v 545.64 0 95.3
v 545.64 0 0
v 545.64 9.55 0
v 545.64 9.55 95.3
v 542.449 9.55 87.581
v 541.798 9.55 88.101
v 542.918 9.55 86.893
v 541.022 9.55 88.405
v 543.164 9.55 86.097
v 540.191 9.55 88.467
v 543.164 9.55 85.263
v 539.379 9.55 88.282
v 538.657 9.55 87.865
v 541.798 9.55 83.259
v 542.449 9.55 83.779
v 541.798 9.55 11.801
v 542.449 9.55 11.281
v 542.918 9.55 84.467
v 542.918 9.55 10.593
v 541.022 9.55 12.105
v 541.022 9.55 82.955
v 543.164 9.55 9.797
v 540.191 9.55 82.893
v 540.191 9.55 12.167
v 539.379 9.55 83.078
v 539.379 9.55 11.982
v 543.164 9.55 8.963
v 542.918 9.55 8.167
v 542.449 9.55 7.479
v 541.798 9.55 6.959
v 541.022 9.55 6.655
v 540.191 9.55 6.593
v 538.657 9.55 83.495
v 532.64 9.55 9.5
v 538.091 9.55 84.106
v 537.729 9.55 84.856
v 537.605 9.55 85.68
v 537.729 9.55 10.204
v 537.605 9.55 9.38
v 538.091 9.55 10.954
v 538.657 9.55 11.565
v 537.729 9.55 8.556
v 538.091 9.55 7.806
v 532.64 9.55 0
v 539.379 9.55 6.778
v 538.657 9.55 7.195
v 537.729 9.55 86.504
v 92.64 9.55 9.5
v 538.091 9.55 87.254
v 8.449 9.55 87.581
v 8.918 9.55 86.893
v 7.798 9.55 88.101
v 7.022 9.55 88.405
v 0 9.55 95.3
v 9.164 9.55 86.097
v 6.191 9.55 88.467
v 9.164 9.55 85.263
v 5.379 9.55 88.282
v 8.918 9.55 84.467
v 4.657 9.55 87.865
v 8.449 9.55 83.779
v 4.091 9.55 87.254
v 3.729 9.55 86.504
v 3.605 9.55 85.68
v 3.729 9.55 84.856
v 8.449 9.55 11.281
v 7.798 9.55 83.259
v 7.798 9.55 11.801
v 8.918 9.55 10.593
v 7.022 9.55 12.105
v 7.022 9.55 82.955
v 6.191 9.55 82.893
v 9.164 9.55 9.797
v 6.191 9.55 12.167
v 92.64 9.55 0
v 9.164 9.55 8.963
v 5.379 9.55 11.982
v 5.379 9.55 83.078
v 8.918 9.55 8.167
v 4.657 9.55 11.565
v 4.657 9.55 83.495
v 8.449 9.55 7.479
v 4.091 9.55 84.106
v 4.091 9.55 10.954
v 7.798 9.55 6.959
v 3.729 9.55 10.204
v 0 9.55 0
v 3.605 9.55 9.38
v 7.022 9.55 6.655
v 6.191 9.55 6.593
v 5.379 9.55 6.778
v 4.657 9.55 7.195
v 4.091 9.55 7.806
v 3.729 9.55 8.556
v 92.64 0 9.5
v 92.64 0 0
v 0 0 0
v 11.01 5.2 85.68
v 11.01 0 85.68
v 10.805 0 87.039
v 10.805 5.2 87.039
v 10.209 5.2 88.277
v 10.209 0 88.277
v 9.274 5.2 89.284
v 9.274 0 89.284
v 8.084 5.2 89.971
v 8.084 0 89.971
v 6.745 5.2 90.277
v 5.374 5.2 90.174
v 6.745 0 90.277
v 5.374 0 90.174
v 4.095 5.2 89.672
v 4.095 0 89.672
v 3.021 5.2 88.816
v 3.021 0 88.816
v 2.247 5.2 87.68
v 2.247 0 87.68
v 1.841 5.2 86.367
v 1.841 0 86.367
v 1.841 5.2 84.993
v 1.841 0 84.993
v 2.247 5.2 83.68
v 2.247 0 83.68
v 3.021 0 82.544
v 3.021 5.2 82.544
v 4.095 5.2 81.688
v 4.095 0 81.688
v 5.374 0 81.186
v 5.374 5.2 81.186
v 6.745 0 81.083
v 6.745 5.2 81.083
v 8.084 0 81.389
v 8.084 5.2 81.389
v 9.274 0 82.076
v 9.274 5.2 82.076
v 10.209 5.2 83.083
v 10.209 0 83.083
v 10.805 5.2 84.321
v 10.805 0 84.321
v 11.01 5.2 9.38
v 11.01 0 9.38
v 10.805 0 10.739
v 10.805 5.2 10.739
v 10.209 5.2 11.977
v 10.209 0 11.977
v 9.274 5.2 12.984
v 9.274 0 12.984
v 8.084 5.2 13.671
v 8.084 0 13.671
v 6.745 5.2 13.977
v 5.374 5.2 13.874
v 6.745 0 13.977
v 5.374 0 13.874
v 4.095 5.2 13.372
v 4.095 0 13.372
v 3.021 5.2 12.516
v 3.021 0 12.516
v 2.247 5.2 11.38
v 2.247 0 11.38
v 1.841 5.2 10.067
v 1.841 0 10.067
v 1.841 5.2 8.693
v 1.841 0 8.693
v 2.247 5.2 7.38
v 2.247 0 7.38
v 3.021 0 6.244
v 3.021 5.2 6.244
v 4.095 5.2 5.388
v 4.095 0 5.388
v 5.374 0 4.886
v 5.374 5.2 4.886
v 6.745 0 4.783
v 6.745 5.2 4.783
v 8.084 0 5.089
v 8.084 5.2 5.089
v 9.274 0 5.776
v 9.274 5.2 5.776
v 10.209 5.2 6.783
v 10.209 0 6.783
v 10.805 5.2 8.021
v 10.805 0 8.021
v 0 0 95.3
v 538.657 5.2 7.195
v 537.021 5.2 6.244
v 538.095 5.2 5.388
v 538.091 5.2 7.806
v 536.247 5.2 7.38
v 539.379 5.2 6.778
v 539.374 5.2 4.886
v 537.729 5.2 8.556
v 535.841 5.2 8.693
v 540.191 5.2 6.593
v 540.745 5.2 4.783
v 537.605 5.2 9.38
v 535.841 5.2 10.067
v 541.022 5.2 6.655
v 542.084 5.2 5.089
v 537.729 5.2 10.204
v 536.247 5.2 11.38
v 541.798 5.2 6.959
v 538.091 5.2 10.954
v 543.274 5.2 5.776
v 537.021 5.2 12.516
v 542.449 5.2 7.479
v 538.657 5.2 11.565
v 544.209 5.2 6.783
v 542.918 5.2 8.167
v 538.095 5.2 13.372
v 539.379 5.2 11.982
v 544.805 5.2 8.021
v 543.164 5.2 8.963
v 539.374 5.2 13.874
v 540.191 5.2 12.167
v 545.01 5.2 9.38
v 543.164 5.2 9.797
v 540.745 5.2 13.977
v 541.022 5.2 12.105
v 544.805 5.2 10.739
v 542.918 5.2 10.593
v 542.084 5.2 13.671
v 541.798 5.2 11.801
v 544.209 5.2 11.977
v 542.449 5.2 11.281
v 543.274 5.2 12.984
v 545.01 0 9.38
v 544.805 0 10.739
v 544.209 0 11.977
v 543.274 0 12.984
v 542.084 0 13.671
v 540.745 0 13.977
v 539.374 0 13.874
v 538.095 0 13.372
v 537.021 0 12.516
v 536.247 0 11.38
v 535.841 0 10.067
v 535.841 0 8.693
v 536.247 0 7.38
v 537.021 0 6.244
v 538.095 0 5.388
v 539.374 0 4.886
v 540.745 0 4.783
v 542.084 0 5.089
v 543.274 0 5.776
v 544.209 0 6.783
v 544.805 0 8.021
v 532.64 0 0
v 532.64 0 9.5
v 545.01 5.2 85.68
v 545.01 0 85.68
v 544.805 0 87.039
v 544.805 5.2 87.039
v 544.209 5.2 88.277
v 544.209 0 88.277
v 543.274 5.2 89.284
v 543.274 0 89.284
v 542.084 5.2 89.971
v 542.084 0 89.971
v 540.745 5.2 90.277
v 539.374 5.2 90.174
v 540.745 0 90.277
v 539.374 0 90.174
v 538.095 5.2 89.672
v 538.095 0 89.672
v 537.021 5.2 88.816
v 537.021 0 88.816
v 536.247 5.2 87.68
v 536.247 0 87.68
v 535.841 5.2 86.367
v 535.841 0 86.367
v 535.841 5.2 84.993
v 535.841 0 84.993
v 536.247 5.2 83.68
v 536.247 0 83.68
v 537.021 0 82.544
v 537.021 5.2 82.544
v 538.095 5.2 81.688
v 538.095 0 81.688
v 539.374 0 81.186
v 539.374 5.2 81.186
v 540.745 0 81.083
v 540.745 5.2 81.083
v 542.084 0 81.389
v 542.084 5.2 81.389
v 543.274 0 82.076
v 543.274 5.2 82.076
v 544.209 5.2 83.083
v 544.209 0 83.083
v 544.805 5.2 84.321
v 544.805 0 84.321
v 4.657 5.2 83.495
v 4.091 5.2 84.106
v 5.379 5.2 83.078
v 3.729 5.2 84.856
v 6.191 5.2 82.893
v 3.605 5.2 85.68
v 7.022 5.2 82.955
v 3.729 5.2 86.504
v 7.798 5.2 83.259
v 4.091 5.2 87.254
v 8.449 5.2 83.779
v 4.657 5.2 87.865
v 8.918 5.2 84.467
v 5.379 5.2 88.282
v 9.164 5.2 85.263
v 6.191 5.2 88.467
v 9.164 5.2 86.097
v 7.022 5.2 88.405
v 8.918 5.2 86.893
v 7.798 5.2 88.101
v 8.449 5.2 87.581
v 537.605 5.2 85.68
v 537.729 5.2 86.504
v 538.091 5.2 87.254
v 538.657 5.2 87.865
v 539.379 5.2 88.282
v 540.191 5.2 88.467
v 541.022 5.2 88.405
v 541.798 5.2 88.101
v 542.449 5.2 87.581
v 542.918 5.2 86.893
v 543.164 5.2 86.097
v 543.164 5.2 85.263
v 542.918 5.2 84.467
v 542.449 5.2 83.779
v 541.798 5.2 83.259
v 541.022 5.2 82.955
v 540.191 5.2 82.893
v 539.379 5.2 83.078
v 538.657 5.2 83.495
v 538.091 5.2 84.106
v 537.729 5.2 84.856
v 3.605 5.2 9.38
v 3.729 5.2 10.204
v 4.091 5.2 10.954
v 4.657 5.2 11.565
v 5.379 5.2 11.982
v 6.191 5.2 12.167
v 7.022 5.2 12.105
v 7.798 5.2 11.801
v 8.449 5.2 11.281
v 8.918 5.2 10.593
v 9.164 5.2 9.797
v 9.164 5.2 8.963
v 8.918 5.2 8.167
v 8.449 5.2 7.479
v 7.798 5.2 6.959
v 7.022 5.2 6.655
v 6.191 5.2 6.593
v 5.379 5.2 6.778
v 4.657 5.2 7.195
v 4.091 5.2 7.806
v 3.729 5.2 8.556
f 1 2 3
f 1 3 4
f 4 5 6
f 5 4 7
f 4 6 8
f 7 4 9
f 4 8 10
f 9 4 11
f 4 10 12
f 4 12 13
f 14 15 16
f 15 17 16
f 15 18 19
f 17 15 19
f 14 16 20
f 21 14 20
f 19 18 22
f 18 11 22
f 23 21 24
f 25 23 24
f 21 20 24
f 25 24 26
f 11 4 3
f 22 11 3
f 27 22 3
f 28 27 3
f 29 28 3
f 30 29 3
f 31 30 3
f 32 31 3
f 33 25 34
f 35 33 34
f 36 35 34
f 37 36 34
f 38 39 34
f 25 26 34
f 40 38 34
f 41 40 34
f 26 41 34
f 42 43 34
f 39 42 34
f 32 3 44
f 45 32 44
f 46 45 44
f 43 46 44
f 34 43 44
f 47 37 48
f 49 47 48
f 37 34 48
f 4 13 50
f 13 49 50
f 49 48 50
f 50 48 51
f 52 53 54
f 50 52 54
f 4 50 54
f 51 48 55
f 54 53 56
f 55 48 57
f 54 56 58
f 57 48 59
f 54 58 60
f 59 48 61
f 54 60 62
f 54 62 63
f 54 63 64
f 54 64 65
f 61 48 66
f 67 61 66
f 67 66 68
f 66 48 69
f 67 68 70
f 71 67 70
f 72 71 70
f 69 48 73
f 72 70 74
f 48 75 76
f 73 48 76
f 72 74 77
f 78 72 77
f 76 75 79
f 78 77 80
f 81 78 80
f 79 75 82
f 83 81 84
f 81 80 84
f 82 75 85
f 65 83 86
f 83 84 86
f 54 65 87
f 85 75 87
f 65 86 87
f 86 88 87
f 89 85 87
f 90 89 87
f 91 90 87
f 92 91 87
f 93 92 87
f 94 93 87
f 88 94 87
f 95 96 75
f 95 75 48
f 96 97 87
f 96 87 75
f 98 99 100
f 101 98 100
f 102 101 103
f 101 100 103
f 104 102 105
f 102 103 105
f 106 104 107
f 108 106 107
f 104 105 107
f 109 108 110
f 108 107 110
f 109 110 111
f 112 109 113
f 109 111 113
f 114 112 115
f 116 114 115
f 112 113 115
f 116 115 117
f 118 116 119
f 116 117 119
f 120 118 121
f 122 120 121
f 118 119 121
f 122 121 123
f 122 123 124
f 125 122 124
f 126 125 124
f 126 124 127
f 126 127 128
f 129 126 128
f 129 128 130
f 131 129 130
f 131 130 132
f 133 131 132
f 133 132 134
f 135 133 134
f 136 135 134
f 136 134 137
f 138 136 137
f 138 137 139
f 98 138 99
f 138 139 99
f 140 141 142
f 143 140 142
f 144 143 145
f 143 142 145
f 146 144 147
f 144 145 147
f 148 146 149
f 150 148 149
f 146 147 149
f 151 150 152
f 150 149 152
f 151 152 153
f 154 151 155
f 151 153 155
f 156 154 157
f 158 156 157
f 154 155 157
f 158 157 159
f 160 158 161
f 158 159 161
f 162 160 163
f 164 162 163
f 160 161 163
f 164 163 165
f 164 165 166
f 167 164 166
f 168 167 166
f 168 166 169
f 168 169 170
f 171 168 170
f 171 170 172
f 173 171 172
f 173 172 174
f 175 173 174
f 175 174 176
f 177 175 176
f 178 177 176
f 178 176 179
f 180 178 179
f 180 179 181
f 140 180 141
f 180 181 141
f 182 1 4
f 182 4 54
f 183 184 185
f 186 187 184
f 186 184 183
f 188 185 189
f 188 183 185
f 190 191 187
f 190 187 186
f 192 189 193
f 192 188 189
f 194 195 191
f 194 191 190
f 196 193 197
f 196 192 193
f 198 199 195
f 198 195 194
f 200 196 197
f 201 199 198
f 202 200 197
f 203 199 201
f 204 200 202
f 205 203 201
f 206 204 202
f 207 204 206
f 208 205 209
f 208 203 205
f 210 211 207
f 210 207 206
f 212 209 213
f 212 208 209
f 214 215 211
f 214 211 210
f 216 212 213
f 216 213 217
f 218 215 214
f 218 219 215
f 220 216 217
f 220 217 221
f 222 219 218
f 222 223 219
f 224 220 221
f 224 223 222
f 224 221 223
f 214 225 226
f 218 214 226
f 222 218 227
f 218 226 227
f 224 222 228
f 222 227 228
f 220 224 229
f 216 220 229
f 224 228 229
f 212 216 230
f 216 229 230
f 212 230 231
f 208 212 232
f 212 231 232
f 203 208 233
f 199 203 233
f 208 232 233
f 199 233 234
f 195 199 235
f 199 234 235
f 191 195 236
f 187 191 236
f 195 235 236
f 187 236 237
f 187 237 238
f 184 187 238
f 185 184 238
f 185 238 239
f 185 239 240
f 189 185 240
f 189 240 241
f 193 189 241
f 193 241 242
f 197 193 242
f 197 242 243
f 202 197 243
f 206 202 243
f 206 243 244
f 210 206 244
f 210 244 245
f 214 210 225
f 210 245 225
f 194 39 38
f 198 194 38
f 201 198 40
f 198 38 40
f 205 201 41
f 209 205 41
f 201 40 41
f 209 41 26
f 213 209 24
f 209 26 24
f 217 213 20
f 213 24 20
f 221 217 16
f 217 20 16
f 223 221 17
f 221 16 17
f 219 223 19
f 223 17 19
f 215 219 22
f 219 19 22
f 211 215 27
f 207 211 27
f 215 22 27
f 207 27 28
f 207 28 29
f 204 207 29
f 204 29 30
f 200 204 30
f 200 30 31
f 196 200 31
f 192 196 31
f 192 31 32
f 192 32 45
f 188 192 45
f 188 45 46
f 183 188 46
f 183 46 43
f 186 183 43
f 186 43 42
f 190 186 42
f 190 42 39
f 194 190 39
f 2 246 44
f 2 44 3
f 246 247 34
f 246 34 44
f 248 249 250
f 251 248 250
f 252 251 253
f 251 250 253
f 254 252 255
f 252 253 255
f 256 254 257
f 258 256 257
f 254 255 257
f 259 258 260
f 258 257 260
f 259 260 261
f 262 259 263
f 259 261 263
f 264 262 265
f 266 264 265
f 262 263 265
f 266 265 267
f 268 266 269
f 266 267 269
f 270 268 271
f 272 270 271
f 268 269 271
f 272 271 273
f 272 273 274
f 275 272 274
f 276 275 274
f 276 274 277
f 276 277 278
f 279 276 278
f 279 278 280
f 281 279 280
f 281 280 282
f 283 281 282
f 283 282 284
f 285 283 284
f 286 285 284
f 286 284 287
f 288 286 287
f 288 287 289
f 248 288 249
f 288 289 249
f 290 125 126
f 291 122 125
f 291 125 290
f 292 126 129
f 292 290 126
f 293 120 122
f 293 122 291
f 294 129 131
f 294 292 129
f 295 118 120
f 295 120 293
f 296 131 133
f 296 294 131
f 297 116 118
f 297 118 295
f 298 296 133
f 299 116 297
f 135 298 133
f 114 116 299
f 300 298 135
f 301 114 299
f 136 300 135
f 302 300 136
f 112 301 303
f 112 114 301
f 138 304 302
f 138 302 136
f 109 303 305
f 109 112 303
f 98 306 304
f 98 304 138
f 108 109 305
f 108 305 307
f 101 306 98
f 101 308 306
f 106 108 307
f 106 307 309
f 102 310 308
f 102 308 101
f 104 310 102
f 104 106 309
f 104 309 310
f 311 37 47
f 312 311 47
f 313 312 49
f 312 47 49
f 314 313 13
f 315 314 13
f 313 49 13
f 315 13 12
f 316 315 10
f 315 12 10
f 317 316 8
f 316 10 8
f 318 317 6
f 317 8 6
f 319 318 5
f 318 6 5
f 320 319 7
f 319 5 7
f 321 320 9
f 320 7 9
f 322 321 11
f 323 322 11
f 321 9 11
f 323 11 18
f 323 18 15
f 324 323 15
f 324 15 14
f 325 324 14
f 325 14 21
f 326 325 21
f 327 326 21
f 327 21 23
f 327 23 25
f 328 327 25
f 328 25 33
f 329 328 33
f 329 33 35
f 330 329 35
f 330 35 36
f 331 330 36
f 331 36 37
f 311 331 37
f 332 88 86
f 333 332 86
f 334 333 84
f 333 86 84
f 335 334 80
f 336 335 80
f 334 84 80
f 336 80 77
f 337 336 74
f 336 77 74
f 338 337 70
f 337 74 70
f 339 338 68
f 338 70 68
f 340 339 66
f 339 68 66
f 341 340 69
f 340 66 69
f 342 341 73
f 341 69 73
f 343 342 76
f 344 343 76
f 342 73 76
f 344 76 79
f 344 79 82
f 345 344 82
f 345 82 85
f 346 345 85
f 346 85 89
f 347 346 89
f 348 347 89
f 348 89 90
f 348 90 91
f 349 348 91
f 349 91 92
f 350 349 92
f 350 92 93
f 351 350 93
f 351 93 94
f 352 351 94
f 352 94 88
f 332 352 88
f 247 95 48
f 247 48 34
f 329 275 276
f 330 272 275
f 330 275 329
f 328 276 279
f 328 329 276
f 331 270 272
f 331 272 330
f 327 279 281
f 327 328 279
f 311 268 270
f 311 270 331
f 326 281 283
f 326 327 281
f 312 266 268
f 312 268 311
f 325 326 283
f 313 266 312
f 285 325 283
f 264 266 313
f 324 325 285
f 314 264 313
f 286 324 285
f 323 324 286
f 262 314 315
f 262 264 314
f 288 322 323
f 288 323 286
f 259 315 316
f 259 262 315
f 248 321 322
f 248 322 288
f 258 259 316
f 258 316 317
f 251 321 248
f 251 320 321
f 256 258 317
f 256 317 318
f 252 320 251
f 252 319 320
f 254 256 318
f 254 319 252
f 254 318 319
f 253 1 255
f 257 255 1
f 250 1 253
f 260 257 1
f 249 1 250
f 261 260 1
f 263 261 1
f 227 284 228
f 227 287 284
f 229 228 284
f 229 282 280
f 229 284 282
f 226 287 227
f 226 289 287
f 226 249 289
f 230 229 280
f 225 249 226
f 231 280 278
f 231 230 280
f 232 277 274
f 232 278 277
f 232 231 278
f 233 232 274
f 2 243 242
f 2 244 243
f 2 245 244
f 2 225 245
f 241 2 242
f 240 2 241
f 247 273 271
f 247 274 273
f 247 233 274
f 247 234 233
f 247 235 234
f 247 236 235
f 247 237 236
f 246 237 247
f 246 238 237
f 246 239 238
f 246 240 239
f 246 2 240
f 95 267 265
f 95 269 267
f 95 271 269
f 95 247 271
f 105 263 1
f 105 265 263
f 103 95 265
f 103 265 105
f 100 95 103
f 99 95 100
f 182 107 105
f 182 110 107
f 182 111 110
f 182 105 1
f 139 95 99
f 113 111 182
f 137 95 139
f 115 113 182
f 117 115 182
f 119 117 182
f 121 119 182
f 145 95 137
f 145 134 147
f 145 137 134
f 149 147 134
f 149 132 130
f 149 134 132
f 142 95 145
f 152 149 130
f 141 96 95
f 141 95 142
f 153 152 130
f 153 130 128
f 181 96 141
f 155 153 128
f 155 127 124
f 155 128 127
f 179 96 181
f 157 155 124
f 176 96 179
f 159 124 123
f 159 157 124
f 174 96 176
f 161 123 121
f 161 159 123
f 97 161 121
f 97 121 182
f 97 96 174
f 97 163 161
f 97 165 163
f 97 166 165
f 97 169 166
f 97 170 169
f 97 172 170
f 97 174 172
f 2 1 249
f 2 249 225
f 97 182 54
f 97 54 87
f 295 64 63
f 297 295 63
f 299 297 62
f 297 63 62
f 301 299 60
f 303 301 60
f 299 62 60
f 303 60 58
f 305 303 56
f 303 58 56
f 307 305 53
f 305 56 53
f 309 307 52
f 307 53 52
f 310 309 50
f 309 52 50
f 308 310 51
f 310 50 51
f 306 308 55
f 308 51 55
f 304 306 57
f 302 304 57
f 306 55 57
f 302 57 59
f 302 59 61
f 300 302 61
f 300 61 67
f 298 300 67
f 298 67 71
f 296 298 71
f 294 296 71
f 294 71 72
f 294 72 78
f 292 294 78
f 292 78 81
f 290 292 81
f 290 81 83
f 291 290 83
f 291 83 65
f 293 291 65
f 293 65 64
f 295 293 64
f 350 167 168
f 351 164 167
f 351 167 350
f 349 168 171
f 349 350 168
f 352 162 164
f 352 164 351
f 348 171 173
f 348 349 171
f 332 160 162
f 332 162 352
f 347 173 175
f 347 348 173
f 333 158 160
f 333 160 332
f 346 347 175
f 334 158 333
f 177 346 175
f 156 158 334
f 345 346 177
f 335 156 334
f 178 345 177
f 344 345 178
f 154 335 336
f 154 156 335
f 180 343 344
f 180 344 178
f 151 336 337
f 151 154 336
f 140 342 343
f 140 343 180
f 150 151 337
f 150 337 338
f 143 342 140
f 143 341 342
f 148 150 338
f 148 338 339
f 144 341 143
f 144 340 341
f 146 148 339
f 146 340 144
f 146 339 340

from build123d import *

# Parameters (mm, degrees)
BOSS_EXTRUDE1_DEPTH = 9.55
CUT_EXTRUDE1_REACH  = 11.55
SKETCH2_R           = 2.795
SKETCH5_R           = 4.61
CUT_EXTRUDE3_DEPTH  = 5.2


with BuildPart() as part:
    # Sketch1 → Boss-Extrude1 (new body)
    with BuildSketch(Plane(origin=(0, 0, 0), x_dir=(1, 0, 0), z_dir=(0, 1, 0))):
        Polygon((532.64, 0), (545.64, 0), (545.64, -95.3), (0, -95.3), (0, 0), (92.64, 0), (92.64, -9.5), (532.64, -9.5), align=None)
    extrude(amount=BOSS_EXTRUDE1_DEPTH)

    # Sketch2 → Cut-Extrude1 (cut, up to next)
    with BuildSketch(Plane(origin=(0, 9.55, 0), x_dir=(-1, 0, 0), z_dir=(0, 1, 0)), mode=Mode.PRIVATE) as cut_extrude1_sk1:
        with Locations((-6.4, 9.38)):
            Circle(SKETCH2_R)
    cut_extrude1_tool1 = extrude(cut_extrude1_sk1.sketch, amount=-CUT_EXTRUDE1_REACH, mode=Mode.PRIVATE) & part.part
    add(cut_extrude1_tool1.solids().sort_by_distance((6.4, 9.55, 9.38))[0], mode=Mode.SUBTRACT)
    # Sketch2 → Cut-Extrude1 (cut, up to next)
    with BuildSketch(Plane(origin=(0, 9.55, 0), x_dir=(-1, 0, 0), z_dir=(0, 1, 0)), mode=Mode.PRIVATE) as cut_extrude1_sk2:
        with Locations((-6.4, 85.68)):
            Circle(SKETCH2_R)
    cut_extrude1_tool2 = extrude(cut_extrude1_sk2.sketch, amount=-CUT_EXTRUDE1_REACH, mode=Mode.PRIVATE) & part.part
    add(cut_extrude1_tool2.solids().sort_by_distance((6.4, 9.55, 85.68))[0], mode=Mode.SUBTRACT)
    # Sketch2 → Cut-Extrude1 (cut, up to next)
    with BuildSketch(Plane(origin=(0, 9.55, 0), x_dir=(-1, 0, 0), z_dir=(0, 1, 0)), mode=Mode.PRIVATE) as cut_extrude1_sk3:
        with Locations((-540.4, 85.68)):
            Circle(SKETCH2_R)
    cut_extrude1_tool3 = extrude(cut_extrude1_sk3.sketch, amount=-CUT_EXTRUDE1_REACH, mode=Mode.PRIVATE) & part.part
    add(cut_extrude1_tool3.solids().sort_by_distance((540.4, 9.55, 85.68))[0], mode=Mode.SUBTRACT)
    # Sketch2 → Cut-Extrude1 (cut, up to next)
    with BuildSketch(Plane(origin=(0, 9.55, 0), x_dir=(-1, 0, 0), z_dir=(0, 1, 0)), mode=Mode.PRIVATE) as cut_extrude1_sk4:
        with Locations((-540.4, 9.38)):
            Circle(SKETCH2_R)
    cut_extrude1_tool4 = extrude(cut_extrude1_sk4.sketch, amount=-CUT_EXTRUDE1_REACH, mode=Mode.PRIVATE) & part.part
    add(cut_extrude1_tool4.solids().sort_by_distance((540.4, 9.55, 9.38))[0], mode=Mode.SUBTRACT)

    # Sketch5 → Cut-Extrude3 (cut)
    with BuildSketch(Plane.XZ):
        with Locations((6.4, 85.68)):
            Circle(SKETCH5_R)
        with Locations((6.4, 9.38)):
            Circle(SKETCH5_R)
        with Locations((540.4, 9.38)):
            Circle(SKETCH5_R)
        with Locations((540.4, 85.68)):
            Circle(SKETCH5_R)
    extrude(amount=-CUT_EXTRUDE3_DEPTH, mode=Mode.SUBTRACT)


solid = part.part
